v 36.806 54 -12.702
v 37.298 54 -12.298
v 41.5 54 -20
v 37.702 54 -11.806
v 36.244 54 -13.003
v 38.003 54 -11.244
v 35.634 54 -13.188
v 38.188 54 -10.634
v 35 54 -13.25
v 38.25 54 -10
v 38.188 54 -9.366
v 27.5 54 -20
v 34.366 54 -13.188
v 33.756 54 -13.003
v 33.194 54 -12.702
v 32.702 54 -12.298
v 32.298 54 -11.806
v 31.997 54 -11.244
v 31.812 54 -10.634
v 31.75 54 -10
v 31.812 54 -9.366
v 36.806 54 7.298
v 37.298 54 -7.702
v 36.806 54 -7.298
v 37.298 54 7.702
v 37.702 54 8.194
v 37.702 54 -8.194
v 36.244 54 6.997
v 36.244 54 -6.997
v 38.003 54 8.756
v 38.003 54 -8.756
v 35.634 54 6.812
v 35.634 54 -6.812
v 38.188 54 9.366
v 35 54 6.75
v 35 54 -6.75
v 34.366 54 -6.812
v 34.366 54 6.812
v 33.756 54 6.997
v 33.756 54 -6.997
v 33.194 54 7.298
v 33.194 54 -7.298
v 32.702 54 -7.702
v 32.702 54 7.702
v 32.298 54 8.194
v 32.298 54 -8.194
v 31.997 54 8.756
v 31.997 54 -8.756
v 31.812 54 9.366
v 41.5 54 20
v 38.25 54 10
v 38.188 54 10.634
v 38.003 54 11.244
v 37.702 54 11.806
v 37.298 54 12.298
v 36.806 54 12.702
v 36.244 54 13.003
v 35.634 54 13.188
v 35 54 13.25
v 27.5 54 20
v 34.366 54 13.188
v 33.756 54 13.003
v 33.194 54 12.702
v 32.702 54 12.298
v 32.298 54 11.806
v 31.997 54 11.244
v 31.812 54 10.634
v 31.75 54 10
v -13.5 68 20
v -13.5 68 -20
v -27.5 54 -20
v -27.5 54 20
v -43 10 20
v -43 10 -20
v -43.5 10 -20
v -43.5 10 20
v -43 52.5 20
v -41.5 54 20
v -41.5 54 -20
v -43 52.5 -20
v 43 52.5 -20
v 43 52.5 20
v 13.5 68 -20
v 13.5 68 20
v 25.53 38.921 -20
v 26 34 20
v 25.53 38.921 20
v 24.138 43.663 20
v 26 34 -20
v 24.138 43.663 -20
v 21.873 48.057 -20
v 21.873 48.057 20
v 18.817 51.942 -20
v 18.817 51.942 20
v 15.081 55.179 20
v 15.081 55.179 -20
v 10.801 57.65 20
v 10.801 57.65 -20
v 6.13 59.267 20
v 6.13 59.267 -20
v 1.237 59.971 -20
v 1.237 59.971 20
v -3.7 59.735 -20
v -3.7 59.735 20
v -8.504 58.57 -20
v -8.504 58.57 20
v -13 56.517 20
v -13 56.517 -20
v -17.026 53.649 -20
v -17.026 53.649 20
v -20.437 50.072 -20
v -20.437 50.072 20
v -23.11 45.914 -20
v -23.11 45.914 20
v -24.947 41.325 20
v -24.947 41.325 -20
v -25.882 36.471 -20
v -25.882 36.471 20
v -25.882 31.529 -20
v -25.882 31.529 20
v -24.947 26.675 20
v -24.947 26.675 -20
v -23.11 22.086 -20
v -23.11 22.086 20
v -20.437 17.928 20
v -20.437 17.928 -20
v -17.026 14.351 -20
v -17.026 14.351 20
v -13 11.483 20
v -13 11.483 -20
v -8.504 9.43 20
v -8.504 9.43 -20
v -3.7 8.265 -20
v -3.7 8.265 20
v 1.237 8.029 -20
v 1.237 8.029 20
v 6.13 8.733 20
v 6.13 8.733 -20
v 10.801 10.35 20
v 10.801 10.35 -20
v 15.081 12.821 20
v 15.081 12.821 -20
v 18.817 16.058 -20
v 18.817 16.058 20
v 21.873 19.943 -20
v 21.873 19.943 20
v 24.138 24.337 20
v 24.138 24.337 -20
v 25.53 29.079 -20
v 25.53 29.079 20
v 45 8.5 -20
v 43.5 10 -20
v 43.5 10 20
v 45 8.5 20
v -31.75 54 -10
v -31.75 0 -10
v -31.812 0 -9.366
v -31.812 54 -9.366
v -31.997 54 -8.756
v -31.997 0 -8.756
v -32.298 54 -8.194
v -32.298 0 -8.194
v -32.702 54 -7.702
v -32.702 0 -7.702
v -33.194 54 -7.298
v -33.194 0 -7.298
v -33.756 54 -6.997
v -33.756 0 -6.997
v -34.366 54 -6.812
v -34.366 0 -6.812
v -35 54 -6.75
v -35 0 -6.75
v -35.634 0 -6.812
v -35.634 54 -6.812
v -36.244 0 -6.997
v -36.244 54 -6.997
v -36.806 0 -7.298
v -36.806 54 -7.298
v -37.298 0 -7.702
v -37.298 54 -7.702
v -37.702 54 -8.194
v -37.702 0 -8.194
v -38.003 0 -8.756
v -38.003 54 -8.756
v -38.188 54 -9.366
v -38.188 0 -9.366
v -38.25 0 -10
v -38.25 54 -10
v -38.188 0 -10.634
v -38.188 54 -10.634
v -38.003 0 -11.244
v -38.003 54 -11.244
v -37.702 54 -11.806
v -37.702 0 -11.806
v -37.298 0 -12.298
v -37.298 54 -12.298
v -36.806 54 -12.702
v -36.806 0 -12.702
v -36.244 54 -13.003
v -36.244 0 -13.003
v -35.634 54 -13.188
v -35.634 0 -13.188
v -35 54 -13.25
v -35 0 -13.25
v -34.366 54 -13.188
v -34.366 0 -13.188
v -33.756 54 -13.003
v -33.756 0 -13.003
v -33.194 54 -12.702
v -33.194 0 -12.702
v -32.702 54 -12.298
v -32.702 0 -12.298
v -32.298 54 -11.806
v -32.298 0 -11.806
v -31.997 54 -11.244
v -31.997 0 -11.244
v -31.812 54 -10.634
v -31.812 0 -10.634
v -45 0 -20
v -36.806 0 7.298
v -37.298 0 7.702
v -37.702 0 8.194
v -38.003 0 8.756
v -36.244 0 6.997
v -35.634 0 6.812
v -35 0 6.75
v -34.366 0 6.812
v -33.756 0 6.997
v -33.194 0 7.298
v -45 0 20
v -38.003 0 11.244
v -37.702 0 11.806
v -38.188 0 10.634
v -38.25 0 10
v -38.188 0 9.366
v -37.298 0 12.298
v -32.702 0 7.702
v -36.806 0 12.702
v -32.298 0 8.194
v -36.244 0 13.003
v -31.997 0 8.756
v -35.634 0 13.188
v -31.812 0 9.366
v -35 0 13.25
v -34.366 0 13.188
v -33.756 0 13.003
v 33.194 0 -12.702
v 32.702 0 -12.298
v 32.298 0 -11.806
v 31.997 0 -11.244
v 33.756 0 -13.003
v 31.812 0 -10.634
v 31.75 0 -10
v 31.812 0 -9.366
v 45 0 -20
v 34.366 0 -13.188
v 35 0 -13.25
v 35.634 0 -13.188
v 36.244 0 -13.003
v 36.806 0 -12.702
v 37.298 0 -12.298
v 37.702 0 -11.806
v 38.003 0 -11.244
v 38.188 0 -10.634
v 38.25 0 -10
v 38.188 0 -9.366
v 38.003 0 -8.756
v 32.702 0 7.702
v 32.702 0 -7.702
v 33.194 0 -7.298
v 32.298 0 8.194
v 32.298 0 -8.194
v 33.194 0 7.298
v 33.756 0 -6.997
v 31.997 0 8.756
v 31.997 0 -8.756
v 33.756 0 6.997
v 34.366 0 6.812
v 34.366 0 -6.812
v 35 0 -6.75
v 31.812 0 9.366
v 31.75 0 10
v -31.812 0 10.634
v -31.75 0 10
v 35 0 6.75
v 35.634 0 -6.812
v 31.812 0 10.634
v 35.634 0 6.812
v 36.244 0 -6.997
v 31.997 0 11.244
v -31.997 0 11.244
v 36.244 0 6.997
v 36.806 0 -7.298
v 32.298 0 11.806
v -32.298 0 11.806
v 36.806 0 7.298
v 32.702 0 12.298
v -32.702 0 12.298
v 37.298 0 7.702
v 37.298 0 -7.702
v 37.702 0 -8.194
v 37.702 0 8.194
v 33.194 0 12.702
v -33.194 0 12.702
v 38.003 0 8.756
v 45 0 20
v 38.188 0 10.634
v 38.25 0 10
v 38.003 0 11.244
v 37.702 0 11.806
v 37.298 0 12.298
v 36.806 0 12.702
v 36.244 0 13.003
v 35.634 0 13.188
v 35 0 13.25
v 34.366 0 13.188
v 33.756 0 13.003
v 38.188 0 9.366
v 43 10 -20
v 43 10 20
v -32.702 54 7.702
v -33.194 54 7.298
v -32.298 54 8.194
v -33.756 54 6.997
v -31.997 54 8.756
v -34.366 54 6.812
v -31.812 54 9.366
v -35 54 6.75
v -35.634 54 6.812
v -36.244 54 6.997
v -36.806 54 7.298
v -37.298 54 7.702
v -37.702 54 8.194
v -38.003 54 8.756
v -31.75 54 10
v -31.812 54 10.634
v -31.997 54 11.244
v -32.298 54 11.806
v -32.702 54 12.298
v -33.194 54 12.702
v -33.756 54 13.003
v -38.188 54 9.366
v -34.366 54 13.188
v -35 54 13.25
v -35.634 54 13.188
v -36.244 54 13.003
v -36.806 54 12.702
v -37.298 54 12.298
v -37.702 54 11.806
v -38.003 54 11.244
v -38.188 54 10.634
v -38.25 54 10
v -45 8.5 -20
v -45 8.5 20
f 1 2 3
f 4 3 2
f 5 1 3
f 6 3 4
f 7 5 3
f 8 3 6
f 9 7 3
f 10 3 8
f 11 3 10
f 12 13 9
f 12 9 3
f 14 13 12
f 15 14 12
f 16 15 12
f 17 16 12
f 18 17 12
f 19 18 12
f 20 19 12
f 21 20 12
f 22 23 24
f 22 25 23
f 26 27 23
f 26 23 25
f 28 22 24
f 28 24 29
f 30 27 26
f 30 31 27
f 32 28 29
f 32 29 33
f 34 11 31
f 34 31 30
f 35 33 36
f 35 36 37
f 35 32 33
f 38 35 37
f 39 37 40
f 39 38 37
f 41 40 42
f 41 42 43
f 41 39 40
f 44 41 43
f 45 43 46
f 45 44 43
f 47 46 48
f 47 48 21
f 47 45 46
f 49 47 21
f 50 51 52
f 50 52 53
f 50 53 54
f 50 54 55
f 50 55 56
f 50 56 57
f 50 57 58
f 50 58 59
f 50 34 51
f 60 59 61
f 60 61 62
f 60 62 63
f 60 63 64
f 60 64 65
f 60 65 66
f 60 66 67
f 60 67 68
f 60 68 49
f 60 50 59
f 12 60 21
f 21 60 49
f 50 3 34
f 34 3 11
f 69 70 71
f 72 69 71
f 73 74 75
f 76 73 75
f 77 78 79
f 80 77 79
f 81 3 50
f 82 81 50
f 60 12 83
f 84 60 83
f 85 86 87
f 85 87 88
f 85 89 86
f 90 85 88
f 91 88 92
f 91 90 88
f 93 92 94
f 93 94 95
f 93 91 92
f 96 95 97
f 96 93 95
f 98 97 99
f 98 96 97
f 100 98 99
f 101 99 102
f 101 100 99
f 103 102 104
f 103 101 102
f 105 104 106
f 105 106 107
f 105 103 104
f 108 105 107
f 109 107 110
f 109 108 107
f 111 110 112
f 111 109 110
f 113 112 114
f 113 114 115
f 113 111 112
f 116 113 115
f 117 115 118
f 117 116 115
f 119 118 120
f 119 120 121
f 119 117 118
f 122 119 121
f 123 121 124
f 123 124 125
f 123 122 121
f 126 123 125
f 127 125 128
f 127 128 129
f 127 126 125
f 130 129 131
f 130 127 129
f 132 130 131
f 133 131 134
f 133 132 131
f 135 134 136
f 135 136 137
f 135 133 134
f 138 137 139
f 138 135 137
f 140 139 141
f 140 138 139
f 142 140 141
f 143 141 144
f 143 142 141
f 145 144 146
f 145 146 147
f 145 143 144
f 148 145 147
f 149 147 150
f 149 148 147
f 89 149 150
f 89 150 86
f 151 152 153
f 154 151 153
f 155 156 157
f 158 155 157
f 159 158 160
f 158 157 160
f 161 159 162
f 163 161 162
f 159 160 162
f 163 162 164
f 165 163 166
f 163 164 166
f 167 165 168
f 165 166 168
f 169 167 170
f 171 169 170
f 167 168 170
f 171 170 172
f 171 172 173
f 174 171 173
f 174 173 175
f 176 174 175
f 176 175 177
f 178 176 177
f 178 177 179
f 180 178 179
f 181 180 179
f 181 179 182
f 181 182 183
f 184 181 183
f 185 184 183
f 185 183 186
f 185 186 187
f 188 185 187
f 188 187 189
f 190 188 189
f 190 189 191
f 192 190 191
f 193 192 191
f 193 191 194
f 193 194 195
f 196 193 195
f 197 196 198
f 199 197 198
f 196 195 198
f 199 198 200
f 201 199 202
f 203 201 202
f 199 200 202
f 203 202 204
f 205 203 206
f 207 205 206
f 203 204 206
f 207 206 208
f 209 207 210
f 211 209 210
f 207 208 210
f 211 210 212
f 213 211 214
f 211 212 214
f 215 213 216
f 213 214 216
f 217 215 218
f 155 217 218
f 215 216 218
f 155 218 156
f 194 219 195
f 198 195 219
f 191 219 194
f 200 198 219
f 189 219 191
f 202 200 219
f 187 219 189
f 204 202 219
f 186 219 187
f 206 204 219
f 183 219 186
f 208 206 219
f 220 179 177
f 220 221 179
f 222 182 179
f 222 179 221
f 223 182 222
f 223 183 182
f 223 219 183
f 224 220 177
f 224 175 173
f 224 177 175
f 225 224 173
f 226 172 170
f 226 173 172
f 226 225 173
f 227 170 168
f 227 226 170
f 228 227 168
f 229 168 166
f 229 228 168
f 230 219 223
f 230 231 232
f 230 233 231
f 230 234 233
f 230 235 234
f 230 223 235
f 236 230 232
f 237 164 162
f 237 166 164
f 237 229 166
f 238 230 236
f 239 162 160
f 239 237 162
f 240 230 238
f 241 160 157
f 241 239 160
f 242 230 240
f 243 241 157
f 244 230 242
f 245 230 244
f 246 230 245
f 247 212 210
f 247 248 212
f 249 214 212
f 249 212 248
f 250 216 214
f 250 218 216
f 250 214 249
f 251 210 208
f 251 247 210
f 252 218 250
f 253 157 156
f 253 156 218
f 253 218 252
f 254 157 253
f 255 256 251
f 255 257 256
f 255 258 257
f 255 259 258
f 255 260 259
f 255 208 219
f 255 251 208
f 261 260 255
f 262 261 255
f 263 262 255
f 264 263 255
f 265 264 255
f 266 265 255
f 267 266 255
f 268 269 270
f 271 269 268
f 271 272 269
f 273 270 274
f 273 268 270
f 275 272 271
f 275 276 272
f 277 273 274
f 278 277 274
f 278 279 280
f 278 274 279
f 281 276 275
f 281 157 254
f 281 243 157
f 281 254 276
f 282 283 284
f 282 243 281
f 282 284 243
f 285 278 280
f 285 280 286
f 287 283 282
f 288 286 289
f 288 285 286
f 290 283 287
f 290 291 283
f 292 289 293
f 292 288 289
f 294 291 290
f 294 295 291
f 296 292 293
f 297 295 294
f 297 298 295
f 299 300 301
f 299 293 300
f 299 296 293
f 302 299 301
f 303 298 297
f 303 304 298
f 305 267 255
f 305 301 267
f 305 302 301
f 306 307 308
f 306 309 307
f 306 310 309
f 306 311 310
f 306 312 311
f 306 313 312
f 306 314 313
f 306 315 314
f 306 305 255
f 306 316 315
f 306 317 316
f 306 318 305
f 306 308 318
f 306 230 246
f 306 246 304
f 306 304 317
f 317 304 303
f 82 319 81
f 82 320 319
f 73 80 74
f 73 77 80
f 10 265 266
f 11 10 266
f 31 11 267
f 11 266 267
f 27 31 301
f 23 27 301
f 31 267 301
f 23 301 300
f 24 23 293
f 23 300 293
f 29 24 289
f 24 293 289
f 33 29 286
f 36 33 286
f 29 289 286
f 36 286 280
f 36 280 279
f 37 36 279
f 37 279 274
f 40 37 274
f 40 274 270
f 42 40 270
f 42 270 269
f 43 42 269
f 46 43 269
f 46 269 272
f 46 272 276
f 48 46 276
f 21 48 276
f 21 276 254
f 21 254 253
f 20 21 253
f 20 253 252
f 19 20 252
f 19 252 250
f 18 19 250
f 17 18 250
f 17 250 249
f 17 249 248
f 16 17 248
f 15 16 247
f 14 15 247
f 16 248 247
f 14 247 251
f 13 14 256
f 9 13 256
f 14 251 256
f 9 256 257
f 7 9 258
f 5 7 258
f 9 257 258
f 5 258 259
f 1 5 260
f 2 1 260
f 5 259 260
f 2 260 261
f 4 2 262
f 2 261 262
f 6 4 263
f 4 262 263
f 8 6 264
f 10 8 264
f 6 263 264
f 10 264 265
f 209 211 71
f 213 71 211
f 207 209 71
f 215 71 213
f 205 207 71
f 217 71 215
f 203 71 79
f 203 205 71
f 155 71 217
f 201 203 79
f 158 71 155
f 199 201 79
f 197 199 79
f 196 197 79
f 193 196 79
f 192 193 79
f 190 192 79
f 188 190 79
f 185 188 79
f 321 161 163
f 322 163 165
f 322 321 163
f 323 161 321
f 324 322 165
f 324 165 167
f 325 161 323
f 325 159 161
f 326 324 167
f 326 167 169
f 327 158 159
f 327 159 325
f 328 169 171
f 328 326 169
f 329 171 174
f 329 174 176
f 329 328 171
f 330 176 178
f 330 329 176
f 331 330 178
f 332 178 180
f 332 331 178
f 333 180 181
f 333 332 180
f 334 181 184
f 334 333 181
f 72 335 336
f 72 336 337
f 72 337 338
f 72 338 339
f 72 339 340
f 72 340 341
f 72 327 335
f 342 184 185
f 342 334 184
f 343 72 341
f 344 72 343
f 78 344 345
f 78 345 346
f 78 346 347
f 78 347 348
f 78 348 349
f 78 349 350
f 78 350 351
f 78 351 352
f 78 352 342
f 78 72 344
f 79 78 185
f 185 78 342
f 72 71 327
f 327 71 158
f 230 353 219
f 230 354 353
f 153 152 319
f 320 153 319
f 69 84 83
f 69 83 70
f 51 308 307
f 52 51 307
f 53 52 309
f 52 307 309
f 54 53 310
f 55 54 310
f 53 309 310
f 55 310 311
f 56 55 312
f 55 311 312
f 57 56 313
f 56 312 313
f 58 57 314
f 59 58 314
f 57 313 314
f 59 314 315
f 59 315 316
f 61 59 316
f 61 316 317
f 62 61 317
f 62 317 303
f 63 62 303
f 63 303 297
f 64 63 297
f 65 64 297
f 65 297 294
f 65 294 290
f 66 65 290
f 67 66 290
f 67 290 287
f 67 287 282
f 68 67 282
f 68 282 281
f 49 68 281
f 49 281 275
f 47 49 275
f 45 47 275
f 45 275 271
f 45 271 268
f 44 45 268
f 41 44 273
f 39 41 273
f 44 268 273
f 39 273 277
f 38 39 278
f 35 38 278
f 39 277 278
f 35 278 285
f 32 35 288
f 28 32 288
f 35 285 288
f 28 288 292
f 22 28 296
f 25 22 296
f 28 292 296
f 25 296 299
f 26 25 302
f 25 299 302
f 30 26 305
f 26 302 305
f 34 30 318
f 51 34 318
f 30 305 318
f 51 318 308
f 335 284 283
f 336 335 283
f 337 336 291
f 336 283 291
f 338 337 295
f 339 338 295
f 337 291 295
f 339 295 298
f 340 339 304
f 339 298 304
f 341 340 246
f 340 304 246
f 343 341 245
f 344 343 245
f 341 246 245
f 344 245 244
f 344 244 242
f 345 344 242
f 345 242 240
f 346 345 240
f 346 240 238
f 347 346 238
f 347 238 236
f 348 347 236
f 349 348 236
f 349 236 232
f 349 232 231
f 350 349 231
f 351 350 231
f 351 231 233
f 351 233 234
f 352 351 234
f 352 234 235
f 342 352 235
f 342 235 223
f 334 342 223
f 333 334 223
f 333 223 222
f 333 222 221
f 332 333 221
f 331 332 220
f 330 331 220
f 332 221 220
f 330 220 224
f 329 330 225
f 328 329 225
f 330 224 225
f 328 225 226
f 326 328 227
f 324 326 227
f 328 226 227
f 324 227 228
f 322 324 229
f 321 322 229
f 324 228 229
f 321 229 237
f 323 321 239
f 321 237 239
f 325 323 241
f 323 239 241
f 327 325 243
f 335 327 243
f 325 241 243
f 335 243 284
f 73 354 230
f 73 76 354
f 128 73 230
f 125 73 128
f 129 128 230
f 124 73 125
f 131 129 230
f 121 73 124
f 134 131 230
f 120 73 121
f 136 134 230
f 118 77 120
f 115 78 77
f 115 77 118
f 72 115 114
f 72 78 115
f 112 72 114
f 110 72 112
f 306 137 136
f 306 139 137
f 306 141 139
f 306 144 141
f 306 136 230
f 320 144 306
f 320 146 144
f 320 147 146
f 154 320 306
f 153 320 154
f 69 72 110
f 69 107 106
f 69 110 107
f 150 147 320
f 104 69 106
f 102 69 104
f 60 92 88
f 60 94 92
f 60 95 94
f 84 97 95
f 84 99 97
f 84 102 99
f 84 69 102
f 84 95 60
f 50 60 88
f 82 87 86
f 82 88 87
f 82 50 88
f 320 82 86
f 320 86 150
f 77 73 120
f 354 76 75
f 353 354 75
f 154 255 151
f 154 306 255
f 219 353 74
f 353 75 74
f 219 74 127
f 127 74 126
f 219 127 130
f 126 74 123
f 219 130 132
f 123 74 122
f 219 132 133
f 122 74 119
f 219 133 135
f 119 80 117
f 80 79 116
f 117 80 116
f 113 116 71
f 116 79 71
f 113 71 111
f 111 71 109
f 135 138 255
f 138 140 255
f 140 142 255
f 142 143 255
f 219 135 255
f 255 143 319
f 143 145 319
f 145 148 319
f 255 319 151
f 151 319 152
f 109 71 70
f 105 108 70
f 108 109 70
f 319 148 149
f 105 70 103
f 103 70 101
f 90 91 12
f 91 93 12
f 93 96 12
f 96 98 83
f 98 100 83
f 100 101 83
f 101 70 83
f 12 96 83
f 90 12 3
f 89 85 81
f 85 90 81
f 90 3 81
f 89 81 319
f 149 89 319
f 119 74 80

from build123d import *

# Parameters (mm, degrees)
SKETCH_R     = 26
PAD_DEPTH    = 20
SKETCH001_R  = 3.25
POCKET_DEPTH = 55
CHAMFER_SIZE = 1.5


with BuildPart() as part:
    # Sketch → Pad (new body, symmetric)
    with BuildSketch(Plane.XY):
        Polygon((-45, 0), (45, 0), (45, 10), (43, 10), (43, 54), (27.5, 54), (13.5, 68), (-13.5, 68), (-27.5, 54), (-43, 54), (-43, 10), (-45, 10), align=None)
        with Locations((0, 34)):
            Circle(SKETCH_R, mode=Mode.SUBTRACT)
    extrude(amount=PAD_DEPTH, both=True)

    # Sketch001 (on Face1 of Pad) → Pocket (cut)
    with BuildSketch(Plane.XZ):
        with Locations((-35, 10)):
            Circle(SKETCH001_R)
        with Locations((35, 10)):
            Circle(SKETCH001_R)
        with Locations((35, -10)):
            Circle(SKETCH001_R)
        with Locations((-35, -10)):
            Circle(SKETCH001_R)
    extrude(amount=-POCKET_DEPTH, mode=Mode.SUBTRACT)

    # Chamfer
    chamfer_edges = [part.edges().sort_by_distance(p)[0] for p in [
        (45, 10, 0),
        (-45, 10, 0),
        (-43, 54, 0),
        (43, 54, 0),
    ]]
    chamfer(chamfer_edges, length=CHAMFER_SIZE)


solid = part.part
